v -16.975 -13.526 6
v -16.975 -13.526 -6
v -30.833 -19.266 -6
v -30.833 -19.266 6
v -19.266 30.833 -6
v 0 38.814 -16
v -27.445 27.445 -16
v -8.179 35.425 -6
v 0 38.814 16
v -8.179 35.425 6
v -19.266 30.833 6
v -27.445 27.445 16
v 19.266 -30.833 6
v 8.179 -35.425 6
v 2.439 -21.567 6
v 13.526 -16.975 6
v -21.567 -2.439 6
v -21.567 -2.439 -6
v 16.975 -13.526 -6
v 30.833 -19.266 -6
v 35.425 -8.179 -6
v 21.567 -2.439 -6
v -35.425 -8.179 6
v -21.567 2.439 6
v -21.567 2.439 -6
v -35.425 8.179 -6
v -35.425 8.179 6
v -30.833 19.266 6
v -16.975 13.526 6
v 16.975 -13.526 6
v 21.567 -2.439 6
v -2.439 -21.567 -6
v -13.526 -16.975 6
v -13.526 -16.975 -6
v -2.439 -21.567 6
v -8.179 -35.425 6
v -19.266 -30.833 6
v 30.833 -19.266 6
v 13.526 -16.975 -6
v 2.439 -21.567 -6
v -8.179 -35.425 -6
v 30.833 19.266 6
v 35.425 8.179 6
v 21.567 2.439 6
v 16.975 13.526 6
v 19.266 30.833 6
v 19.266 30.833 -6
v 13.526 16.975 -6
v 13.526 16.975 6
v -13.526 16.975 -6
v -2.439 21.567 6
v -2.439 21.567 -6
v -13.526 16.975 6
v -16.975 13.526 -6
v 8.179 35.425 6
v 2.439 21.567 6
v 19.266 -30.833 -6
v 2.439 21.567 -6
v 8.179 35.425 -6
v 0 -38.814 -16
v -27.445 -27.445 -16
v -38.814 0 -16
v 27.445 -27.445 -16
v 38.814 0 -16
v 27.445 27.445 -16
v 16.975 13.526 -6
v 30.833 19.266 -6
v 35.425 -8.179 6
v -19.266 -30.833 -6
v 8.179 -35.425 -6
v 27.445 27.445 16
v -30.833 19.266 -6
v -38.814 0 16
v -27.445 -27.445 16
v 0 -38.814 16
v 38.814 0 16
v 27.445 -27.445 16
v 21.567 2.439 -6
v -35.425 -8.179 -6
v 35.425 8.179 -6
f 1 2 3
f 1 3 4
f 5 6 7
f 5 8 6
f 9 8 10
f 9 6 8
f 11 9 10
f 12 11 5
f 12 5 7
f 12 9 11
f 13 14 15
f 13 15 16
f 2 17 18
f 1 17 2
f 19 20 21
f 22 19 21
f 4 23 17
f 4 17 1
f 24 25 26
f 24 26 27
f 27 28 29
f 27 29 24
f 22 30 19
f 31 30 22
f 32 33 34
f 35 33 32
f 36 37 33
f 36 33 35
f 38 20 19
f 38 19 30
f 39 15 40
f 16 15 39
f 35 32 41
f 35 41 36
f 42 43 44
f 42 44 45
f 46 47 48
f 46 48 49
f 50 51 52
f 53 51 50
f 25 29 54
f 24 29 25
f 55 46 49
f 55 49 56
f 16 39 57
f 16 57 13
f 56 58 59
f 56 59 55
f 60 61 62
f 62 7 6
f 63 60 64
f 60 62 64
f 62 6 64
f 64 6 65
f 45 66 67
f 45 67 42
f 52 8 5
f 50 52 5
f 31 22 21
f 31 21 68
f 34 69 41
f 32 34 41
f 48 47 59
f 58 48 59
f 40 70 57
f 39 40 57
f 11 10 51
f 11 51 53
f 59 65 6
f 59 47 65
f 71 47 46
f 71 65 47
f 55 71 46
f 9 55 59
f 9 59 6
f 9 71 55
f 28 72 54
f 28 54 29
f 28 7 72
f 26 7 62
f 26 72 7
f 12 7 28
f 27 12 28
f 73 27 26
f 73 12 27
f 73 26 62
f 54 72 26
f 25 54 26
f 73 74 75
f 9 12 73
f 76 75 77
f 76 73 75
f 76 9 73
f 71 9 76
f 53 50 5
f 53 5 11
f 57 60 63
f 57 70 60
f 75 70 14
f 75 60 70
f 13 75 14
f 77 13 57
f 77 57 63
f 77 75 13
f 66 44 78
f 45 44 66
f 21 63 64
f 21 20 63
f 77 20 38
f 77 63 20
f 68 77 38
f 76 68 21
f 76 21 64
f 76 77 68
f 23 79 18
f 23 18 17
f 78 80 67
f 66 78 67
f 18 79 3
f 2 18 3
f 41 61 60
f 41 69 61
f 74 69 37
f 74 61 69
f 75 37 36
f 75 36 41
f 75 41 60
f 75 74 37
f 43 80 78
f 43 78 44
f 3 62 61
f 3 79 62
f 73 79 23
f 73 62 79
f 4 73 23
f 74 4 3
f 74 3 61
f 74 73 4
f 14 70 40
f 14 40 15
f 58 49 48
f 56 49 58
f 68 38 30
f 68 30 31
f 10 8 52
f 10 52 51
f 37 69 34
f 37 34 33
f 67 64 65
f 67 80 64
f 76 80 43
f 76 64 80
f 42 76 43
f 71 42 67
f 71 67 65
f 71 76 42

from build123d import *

# Parameters (mm, degrees)
F1_DEPTH        = 16
F2_W            = 12
F2_H            = 12
F4_DEPTH        = 15
F4_COPIES_COUNT = 8
F5_W            = 32
F5_H            = 32
F6_DEPTH        = 38.627


# Not quite as in the source:
# - a pattern or mirror of a feature is missing from the dataset's text; its kind, count and spacing are read off the source's solid


with BuildPart() as f1:
    # F0 (on Top) → F1 (new body, symmetric)
    with BuildSketch(Plane.XY):
        Polygon((-27.4452890516, 27.4452890516), (-38.8135, 0), (-27.4452890516, -27.4452890516), (0, -38.8135), (27.4452890516, -27.4452890516), (38.8135, 0), (27.4452890516, 27.4452890516), (0, 38.8135), align=None)
    extrude(amount=F1_DEPTH, both=True)

    # F2 (on face) → F4 (cut)
    with BuildSketch(Plane(origin=(-13.7226445258, -33.1293945258, 0), x_dir=(0.9238795325, -0.3826834324, 0), z_dir=(-0.3826834324, -0.9238795325, 0))):
        Rectangle(F2_W, F2_H)
    f4 = extrude(amount=-F4_DEPTH, mode=Mode.SUBTRACT)

    # F4_copies: F4 ×8 about axis
    f4_copies_axis = Axis((0, 0, 0), (0, 0, 1))
    for i in range(1, F4_COPIES_COUNT):
        add(f4.rotate(f4_copies_axis, i * 360 / F4_COPIES_COUNT), mode=Mode.SUBTRACT)


with BuildPart() as f6:
    # F5 (on Top) → F6 (new body, symmetric)
    with BuildSketch(Plane.XY):
        Rectangle(F5_W, F5_H)
    extrude(amount=F6_DEPTH, both=True)


solid = f1.part
